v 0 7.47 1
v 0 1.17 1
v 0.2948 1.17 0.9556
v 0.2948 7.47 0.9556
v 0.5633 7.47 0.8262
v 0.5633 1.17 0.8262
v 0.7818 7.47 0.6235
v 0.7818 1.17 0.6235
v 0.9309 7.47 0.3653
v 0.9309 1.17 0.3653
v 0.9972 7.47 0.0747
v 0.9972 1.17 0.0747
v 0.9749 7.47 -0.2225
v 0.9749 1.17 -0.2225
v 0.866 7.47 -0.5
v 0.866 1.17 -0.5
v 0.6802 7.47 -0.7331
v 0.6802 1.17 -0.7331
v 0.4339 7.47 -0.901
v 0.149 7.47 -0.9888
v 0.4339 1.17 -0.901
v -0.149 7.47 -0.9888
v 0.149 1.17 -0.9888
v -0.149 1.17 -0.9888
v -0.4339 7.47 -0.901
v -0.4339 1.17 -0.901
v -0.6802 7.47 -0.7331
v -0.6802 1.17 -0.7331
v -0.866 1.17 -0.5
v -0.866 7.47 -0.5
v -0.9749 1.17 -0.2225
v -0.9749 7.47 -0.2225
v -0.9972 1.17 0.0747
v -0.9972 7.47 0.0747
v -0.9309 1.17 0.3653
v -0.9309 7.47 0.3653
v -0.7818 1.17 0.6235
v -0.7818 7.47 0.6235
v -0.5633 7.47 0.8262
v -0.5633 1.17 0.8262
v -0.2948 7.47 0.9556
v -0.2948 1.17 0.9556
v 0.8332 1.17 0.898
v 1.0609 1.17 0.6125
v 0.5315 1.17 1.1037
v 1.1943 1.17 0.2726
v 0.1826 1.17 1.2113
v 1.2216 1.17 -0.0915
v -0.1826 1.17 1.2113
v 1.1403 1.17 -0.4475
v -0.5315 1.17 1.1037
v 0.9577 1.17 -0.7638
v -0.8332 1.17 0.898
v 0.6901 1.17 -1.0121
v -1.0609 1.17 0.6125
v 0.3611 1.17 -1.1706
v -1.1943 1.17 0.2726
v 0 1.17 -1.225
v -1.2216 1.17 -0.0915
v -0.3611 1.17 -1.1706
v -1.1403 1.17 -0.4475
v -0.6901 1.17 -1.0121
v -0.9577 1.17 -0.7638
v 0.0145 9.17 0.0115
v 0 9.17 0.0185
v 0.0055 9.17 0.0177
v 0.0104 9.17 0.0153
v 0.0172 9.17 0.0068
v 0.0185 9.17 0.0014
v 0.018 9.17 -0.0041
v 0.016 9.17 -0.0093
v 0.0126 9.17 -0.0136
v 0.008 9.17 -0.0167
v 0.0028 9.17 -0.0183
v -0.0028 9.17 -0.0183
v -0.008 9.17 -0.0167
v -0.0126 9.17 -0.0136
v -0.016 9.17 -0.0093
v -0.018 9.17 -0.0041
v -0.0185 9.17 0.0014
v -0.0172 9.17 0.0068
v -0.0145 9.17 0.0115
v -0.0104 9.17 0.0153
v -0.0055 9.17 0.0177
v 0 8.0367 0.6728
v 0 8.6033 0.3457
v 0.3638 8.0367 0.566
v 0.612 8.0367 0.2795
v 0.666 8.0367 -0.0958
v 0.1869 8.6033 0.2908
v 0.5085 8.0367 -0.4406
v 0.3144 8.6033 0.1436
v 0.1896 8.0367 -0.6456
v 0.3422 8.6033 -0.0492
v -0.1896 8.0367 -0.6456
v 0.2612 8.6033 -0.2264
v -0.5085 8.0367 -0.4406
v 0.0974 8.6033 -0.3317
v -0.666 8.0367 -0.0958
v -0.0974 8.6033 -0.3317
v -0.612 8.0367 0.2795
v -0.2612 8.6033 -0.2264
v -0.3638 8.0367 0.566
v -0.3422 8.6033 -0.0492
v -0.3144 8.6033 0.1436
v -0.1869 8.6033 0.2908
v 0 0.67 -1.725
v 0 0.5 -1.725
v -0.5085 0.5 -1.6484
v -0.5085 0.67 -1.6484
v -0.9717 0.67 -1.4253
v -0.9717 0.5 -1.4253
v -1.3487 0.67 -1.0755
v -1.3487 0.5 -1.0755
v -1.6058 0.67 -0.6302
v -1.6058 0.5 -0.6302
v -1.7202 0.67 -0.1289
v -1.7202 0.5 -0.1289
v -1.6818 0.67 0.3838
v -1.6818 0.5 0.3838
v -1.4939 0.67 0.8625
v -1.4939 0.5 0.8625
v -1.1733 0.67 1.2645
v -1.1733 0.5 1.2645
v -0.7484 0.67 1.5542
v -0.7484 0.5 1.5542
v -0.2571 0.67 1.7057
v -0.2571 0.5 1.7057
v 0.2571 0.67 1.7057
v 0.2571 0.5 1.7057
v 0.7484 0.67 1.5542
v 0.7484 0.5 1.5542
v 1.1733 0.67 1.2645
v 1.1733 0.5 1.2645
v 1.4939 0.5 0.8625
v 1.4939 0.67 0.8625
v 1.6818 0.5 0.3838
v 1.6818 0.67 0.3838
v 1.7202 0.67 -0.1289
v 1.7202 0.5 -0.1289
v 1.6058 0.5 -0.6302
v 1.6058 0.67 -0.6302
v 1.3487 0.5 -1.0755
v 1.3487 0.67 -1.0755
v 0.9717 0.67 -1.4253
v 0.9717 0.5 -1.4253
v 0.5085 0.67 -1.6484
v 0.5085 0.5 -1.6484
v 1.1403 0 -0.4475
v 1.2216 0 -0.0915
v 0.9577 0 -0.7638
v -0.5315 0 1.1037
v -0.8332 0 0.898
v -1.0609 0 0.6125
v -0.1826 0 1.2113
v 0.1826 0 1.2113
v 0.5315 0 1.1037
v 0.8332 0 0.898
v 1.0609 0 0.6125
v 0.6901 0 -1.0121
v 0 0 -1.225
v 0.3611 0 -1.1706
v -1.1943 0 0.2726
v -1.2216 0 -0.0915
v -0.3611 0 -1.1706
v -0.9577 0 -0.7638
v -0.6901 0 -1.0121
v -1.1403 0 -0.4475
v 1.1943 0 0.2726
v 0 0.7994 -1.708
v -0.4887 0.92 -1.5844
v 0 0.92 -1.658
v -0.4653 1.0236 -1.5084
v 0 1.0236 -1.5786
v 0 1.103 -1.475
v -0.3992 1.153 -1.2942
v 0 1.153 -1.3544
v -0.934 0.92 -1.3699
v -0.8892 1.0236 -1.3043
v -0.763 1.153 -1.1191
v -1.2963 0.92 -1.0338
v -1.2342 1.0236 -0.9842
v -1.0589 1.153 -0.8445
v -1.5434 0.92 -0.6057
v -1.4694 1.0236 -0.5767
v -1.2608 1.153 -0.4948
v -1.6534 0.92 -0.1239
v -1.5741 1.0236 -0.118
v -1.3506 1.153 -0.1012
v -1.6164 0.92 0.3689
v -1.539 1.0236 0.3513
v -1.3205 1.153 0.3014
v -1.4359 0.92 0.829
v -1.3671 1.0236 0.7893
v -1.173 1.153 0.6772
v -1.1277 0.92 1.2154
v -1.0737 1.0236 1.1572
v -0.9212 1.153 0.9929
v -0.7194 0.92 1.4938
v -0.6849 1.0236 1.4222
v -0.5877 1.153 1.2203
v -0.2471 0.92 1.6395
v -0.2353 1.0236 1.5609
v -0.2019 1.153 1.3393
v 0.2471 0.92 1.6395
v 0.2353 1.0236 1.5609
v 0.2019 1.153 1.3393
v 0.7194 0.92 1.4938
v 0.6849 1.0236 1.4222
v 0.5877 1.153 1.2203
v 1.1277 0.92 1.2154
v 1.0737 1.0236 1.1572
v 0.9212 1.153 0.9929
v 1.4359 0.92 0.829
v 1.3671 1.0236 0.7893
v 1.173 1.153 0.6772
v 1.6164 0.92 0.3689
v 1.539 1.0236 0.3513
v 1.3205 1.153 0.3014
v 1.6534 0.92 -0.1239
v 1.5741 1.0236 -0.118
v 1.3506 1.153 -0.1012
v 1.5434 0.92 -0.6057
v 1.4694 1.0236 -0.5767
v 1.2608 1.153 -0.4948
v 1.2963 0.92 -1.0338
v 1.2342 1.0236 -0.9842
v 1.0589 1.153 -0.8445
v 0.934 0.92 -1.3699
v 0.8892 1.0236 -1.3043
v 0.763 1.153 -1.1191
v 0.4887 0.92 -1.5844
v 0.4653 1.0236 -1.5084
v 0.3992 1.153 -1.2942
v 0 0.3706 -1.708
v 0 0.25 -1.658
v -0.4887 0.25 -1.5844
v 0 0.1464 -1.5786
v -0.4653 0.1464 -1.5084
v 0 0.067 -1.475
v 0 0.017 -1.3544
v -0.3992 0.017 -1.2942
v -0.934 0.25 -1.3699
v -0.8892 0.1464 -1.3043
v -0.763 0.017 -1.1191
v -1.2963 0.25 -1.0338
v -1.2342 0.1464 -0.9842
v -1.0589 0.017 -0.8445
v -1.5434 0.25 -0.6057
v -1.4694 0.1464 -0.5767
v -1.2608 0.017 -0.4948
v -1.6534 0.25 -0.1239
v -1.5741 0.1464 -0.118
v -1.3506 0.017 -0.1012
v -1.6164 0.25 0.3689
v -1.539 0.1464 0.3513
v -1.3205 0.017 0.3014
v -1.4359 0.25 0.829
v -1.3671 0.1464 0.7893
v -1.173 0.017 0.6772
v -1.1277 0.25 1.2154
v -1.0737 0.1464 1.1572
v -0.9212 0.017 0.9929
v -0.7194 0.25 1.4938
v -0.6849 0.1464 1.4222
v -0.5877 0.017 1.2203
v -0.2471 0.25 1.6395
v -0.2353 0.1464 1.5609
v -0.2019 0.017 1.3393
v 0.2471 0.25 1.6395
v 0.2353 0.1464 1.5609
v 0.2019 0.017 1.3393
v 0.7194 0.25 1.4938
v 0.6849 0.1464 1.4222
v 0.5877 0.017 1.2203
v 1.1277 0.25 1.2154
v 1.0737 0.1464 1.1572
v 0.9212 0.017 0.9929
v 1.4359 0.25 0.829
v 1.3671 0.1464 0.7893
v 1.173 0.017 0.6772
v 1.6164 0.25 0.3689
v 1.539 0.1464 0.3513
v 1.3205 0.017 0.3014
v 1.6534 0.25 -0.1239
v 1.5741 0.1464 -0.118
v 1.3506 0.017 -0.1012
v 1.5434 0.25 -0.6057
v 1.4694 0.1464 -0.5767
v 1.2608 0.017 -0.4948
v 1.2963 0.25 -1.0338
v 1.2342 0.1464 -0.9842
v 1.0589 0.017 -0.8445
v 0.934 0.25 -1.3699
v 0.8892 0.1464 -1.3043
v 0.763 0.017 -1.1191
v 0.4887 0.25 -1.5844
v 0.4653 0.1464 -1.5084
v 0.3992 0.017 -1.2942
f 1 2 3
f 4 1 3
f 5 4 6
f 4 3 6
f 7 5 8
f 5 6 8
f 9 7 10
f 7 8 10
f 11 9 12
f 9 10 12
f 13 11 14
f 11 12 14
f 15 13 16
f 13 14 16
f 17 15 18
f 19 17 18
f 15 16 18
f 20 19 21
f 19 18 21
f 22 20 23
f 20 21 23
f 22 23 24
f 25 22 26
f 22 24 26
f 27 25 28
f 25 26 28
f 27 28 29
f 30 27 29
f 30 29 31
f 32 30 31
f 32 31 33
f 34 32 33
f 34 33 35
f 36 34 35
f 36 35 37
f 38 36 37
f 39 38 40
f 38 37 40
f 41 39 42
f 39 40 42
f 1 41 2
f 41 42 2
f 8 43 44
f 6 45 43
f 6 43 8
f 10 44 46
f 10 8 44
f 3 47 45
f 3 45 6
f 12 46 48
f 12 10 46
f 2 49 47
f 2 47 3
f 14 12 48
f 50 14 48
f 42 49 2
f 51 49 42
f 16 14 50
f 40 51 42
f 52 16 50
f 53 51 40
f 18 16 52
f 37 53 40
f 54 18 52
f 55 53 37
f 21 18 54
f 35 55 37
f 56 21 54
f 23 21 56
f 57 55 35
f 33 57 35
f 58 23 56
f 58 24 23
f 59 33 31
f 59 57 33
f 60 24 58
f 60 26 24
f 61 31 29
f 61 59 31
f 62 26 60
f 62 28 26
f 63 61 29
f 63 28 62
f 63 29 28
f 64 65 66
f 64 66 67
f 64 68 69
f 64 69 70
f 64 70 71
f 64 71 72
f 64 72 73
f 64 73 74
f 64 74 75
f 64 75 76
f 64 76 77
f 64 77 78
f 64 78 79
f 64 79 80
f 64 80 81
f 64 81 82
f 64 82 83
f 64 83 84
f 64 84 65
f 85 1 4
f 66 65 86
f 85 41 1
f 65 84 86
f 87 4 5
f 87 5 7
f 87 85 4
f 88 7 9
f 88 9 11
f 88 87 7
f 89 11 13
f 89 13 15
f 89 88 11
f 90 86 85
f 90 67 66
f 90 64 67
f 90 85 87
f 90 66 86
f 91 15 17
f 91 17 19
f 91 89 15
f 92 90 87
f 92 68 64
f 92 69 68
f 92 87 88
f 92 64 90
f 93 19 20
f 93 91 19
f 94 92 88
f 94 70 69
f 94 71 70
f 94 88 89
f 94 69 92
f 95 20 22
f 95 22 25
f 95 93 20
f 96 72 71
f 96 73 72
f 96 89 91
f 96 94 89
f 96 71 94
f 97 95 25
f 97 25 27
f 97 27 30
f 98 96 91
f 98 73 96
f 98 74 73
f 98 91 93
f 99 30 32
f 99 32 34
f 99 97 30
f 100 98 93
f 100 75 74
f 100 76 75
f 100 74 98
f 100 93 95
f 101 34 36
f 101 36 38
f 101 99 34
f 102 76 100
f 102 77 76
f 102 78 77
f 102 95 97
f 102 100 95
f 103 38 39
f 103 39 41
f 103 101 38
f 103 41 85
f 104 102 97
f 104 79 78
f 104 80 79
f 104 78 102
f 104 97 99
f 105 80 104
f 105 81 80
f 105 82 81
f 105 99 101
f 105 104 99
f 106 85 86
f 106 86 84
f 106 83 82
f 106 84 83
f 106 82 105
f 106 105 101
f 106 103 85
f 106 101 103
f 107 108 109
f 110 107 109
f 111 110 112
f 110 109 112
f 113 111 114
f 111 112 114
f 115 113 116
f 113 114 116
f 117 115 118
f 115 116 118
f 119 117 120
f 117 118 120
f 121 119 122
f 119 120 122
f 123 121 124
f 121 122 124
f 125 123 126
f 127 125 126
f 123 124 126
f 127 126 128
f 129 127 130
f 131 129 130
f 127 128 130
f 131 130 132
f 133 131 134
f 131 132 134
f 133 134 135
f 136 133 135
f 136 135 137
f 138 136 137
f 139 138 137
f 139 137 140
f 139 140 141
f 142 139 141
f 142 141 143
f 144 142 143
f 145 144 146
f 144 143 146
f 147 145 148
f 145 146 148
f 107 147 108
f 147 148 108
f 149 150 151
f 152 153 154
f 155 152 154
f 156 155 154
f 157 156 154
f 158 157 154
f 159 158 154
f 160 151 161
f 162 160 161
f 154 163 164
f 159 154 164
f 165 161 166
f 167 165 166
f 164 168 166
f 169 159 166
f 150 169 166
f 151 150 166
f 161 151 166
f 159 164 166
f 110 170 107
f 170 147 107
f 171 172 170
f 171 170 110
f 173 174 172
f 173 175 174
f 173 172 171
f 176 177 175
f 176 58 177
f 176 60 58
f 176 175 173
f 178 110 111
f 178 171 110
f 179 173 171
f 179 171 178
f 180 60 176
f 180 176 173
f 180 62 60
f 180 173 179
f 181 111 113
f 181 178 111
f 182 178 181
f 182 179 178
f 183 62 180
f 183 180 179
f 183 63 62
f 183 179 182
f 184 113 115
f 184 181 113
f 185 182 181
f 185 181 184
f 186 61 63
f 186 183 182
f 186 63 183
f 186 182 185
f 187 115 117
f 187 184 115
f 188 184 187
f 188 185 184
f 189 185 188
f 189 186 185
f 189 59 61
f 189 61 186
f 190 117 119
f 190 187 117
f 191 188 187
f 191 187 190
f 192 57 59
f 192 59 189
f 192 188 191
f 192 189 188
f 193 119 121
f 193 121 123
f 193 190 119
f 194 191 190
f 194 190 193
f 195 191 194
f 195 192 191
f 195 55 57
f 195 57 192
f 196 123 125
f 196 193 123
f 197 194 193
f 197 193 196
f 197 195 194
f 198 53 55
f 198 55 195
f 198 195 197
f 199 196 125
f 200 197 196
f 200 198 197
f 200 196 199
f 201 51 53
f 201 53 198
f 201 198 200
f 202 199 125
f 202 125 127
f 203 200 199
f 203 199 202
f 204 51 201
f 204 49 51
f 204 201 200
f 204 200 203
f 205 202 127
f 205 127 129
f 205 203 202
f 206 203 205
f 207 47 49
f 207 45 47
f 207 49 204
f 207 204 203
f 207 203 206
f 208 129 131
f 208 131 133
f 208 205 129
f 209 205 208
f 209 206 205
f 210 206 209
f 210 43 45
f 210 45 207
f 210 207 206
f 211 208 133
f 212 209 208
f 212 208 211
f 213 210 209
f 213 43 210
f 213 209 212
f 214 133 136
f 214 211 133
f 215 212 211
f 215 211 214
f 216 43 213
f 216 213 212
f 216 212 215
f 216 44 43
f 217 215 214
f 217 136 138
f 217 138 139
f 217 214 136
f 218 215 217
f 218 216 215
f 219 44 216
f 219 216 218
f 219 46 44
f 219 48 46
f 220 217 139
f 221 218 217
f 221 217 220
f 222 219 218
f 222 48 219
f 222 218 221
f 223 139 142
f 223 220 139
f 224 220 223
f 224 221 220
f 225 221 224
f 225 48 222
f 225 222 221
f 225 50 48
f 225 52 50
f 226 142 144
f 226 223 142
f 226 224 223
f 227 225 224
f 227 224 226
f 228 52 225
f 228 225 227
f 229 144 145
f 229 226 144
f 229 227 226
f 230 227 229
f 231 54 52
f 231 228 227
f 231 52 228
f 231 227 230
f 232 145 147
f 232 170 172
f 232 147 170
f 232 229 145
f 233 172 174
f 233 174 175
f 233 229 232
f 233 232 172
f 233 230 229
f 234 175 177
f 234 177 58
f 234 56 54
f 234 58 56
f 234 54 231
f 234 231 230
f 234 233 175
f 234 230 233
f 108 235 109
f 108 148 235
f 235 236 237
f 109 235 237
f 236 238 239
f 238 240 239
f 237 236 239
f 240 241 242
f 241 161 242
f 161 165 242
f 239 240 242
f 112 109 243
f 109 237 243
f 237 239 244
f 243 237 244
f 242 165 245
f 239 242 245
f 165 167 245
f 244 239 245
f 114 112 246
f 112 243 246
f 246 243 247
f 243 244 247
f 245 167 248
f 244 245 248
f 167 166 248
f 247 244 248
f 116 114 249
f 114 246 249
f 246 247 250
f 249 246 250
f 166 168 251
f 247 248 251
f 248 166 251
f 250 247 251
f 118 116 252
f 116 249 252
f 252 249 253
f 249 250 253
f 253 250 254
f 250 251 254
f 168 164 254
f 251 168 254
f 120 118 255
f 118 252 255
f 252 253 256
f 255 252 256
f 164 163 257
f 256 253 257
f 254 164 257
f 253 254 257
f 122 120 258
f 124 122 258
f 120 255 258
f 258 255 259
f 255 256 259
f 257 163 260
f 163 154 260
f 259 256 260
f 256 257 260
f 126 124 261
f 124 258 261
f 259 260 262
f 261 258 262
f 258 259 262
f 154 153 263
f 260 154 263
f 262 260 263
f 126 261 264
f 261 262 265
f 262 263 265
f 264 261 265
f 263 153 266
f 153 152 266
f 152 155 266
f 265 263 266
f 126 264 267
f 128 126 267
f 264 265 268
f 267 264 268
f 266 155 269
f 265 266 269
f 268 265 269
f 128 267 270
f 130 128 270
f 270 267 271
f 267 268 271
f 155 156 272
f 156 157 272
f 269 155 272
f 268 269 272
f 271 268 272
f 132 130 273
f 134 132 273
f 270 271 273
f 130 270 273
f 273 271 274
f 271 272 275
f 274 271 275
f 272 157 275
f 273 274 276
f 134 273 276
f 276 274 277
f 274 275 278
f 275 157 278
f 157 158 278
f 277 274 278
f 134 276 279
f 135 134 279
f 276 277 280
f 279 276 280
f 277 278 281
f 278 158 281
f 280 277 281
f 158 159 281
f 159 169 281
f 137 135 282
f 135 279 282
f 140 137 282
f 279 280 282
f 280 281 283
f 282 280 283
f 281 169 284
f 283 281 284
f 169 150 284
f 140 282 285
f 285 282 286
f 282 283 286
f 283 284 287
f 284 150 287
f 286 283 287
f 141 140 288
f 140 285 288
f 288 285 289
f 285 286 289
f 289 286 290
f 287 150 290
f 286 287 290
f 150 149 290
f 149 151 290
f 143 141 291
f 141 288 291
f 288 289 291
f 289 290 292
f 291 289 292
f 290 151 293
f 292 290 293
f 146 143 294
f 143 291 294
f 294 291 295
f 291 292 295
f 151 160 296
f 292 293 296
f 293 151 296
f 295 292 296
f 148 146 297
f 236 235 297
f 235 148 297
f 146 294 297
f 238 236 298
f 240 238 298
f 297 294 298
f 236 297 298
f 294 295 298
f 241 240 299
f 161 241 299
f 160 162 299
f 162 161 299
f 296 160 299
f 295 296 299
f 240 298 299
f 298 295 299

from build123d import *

# Parameters (mm, degrees)
SKETCH_1_R      = 1.725
EXTRUDE_1_DEPTH = 1.17
FILLET_1_R      = 0.5
SKETCH_2_R      = 1
EXTRUDE_2_DEPTH = 8
CHAMFER_1_SIZE  = 1.7
CHAMFER_1_SIZE2 = 0.981495458


with BuildPart() as part:
    # 草图1 → 凸台-拉伸1 (new body)
    with BuildSketch(Plane(origin=(0, 0, 0), x_dir=(1, 0, 0), z_dir=(0, 1, 0))):
        with Locations(Location((0, 0, 0), (0, 0, 90))):
            Circle(SKETCH_1_R)
    extrude(amount=EXTRUDE_1_DEPTH)

    # 圆角1
    fillet_1_edges = [part.edges().sort_by_distance(p)[0] for p in [
        (0, 0, 1.725),
        (0, 1.17, 1.725),
    ]]
    fillet(fillet_1_edges, radius=FILLET_1_R)

    # 草图2 → 凸台-拉伸2 (add)
    with BuildSketch(Plane(origin=(0, 1.17, 0), x_dir=(1, 0, 0), z_dir=(0, 1, 0))):
        with Locations(Location((0, 0, 0), (0, 0, 270))):
            Circle(SKETCH_2_R)
    extrude(amount=EXTRUDE_2_DEPTH)

    # 倒角1
    chamfer_1_edges = [part.edges().sort_by_distance(p)[0] for p in [
        (0, 9.17, -1),
    ]]
    chamfer_1_side = [part.faces().sort_by_distance(p)[0] for p in [
        (0, 5.17, -1),
    ]]
    chamfer(chamfer_1_edges, length=CHAMFER_1_SIZE, length2=CHAMFER_1_SIZE2, reference=chamfer_1_side[0])


solid = part.part
